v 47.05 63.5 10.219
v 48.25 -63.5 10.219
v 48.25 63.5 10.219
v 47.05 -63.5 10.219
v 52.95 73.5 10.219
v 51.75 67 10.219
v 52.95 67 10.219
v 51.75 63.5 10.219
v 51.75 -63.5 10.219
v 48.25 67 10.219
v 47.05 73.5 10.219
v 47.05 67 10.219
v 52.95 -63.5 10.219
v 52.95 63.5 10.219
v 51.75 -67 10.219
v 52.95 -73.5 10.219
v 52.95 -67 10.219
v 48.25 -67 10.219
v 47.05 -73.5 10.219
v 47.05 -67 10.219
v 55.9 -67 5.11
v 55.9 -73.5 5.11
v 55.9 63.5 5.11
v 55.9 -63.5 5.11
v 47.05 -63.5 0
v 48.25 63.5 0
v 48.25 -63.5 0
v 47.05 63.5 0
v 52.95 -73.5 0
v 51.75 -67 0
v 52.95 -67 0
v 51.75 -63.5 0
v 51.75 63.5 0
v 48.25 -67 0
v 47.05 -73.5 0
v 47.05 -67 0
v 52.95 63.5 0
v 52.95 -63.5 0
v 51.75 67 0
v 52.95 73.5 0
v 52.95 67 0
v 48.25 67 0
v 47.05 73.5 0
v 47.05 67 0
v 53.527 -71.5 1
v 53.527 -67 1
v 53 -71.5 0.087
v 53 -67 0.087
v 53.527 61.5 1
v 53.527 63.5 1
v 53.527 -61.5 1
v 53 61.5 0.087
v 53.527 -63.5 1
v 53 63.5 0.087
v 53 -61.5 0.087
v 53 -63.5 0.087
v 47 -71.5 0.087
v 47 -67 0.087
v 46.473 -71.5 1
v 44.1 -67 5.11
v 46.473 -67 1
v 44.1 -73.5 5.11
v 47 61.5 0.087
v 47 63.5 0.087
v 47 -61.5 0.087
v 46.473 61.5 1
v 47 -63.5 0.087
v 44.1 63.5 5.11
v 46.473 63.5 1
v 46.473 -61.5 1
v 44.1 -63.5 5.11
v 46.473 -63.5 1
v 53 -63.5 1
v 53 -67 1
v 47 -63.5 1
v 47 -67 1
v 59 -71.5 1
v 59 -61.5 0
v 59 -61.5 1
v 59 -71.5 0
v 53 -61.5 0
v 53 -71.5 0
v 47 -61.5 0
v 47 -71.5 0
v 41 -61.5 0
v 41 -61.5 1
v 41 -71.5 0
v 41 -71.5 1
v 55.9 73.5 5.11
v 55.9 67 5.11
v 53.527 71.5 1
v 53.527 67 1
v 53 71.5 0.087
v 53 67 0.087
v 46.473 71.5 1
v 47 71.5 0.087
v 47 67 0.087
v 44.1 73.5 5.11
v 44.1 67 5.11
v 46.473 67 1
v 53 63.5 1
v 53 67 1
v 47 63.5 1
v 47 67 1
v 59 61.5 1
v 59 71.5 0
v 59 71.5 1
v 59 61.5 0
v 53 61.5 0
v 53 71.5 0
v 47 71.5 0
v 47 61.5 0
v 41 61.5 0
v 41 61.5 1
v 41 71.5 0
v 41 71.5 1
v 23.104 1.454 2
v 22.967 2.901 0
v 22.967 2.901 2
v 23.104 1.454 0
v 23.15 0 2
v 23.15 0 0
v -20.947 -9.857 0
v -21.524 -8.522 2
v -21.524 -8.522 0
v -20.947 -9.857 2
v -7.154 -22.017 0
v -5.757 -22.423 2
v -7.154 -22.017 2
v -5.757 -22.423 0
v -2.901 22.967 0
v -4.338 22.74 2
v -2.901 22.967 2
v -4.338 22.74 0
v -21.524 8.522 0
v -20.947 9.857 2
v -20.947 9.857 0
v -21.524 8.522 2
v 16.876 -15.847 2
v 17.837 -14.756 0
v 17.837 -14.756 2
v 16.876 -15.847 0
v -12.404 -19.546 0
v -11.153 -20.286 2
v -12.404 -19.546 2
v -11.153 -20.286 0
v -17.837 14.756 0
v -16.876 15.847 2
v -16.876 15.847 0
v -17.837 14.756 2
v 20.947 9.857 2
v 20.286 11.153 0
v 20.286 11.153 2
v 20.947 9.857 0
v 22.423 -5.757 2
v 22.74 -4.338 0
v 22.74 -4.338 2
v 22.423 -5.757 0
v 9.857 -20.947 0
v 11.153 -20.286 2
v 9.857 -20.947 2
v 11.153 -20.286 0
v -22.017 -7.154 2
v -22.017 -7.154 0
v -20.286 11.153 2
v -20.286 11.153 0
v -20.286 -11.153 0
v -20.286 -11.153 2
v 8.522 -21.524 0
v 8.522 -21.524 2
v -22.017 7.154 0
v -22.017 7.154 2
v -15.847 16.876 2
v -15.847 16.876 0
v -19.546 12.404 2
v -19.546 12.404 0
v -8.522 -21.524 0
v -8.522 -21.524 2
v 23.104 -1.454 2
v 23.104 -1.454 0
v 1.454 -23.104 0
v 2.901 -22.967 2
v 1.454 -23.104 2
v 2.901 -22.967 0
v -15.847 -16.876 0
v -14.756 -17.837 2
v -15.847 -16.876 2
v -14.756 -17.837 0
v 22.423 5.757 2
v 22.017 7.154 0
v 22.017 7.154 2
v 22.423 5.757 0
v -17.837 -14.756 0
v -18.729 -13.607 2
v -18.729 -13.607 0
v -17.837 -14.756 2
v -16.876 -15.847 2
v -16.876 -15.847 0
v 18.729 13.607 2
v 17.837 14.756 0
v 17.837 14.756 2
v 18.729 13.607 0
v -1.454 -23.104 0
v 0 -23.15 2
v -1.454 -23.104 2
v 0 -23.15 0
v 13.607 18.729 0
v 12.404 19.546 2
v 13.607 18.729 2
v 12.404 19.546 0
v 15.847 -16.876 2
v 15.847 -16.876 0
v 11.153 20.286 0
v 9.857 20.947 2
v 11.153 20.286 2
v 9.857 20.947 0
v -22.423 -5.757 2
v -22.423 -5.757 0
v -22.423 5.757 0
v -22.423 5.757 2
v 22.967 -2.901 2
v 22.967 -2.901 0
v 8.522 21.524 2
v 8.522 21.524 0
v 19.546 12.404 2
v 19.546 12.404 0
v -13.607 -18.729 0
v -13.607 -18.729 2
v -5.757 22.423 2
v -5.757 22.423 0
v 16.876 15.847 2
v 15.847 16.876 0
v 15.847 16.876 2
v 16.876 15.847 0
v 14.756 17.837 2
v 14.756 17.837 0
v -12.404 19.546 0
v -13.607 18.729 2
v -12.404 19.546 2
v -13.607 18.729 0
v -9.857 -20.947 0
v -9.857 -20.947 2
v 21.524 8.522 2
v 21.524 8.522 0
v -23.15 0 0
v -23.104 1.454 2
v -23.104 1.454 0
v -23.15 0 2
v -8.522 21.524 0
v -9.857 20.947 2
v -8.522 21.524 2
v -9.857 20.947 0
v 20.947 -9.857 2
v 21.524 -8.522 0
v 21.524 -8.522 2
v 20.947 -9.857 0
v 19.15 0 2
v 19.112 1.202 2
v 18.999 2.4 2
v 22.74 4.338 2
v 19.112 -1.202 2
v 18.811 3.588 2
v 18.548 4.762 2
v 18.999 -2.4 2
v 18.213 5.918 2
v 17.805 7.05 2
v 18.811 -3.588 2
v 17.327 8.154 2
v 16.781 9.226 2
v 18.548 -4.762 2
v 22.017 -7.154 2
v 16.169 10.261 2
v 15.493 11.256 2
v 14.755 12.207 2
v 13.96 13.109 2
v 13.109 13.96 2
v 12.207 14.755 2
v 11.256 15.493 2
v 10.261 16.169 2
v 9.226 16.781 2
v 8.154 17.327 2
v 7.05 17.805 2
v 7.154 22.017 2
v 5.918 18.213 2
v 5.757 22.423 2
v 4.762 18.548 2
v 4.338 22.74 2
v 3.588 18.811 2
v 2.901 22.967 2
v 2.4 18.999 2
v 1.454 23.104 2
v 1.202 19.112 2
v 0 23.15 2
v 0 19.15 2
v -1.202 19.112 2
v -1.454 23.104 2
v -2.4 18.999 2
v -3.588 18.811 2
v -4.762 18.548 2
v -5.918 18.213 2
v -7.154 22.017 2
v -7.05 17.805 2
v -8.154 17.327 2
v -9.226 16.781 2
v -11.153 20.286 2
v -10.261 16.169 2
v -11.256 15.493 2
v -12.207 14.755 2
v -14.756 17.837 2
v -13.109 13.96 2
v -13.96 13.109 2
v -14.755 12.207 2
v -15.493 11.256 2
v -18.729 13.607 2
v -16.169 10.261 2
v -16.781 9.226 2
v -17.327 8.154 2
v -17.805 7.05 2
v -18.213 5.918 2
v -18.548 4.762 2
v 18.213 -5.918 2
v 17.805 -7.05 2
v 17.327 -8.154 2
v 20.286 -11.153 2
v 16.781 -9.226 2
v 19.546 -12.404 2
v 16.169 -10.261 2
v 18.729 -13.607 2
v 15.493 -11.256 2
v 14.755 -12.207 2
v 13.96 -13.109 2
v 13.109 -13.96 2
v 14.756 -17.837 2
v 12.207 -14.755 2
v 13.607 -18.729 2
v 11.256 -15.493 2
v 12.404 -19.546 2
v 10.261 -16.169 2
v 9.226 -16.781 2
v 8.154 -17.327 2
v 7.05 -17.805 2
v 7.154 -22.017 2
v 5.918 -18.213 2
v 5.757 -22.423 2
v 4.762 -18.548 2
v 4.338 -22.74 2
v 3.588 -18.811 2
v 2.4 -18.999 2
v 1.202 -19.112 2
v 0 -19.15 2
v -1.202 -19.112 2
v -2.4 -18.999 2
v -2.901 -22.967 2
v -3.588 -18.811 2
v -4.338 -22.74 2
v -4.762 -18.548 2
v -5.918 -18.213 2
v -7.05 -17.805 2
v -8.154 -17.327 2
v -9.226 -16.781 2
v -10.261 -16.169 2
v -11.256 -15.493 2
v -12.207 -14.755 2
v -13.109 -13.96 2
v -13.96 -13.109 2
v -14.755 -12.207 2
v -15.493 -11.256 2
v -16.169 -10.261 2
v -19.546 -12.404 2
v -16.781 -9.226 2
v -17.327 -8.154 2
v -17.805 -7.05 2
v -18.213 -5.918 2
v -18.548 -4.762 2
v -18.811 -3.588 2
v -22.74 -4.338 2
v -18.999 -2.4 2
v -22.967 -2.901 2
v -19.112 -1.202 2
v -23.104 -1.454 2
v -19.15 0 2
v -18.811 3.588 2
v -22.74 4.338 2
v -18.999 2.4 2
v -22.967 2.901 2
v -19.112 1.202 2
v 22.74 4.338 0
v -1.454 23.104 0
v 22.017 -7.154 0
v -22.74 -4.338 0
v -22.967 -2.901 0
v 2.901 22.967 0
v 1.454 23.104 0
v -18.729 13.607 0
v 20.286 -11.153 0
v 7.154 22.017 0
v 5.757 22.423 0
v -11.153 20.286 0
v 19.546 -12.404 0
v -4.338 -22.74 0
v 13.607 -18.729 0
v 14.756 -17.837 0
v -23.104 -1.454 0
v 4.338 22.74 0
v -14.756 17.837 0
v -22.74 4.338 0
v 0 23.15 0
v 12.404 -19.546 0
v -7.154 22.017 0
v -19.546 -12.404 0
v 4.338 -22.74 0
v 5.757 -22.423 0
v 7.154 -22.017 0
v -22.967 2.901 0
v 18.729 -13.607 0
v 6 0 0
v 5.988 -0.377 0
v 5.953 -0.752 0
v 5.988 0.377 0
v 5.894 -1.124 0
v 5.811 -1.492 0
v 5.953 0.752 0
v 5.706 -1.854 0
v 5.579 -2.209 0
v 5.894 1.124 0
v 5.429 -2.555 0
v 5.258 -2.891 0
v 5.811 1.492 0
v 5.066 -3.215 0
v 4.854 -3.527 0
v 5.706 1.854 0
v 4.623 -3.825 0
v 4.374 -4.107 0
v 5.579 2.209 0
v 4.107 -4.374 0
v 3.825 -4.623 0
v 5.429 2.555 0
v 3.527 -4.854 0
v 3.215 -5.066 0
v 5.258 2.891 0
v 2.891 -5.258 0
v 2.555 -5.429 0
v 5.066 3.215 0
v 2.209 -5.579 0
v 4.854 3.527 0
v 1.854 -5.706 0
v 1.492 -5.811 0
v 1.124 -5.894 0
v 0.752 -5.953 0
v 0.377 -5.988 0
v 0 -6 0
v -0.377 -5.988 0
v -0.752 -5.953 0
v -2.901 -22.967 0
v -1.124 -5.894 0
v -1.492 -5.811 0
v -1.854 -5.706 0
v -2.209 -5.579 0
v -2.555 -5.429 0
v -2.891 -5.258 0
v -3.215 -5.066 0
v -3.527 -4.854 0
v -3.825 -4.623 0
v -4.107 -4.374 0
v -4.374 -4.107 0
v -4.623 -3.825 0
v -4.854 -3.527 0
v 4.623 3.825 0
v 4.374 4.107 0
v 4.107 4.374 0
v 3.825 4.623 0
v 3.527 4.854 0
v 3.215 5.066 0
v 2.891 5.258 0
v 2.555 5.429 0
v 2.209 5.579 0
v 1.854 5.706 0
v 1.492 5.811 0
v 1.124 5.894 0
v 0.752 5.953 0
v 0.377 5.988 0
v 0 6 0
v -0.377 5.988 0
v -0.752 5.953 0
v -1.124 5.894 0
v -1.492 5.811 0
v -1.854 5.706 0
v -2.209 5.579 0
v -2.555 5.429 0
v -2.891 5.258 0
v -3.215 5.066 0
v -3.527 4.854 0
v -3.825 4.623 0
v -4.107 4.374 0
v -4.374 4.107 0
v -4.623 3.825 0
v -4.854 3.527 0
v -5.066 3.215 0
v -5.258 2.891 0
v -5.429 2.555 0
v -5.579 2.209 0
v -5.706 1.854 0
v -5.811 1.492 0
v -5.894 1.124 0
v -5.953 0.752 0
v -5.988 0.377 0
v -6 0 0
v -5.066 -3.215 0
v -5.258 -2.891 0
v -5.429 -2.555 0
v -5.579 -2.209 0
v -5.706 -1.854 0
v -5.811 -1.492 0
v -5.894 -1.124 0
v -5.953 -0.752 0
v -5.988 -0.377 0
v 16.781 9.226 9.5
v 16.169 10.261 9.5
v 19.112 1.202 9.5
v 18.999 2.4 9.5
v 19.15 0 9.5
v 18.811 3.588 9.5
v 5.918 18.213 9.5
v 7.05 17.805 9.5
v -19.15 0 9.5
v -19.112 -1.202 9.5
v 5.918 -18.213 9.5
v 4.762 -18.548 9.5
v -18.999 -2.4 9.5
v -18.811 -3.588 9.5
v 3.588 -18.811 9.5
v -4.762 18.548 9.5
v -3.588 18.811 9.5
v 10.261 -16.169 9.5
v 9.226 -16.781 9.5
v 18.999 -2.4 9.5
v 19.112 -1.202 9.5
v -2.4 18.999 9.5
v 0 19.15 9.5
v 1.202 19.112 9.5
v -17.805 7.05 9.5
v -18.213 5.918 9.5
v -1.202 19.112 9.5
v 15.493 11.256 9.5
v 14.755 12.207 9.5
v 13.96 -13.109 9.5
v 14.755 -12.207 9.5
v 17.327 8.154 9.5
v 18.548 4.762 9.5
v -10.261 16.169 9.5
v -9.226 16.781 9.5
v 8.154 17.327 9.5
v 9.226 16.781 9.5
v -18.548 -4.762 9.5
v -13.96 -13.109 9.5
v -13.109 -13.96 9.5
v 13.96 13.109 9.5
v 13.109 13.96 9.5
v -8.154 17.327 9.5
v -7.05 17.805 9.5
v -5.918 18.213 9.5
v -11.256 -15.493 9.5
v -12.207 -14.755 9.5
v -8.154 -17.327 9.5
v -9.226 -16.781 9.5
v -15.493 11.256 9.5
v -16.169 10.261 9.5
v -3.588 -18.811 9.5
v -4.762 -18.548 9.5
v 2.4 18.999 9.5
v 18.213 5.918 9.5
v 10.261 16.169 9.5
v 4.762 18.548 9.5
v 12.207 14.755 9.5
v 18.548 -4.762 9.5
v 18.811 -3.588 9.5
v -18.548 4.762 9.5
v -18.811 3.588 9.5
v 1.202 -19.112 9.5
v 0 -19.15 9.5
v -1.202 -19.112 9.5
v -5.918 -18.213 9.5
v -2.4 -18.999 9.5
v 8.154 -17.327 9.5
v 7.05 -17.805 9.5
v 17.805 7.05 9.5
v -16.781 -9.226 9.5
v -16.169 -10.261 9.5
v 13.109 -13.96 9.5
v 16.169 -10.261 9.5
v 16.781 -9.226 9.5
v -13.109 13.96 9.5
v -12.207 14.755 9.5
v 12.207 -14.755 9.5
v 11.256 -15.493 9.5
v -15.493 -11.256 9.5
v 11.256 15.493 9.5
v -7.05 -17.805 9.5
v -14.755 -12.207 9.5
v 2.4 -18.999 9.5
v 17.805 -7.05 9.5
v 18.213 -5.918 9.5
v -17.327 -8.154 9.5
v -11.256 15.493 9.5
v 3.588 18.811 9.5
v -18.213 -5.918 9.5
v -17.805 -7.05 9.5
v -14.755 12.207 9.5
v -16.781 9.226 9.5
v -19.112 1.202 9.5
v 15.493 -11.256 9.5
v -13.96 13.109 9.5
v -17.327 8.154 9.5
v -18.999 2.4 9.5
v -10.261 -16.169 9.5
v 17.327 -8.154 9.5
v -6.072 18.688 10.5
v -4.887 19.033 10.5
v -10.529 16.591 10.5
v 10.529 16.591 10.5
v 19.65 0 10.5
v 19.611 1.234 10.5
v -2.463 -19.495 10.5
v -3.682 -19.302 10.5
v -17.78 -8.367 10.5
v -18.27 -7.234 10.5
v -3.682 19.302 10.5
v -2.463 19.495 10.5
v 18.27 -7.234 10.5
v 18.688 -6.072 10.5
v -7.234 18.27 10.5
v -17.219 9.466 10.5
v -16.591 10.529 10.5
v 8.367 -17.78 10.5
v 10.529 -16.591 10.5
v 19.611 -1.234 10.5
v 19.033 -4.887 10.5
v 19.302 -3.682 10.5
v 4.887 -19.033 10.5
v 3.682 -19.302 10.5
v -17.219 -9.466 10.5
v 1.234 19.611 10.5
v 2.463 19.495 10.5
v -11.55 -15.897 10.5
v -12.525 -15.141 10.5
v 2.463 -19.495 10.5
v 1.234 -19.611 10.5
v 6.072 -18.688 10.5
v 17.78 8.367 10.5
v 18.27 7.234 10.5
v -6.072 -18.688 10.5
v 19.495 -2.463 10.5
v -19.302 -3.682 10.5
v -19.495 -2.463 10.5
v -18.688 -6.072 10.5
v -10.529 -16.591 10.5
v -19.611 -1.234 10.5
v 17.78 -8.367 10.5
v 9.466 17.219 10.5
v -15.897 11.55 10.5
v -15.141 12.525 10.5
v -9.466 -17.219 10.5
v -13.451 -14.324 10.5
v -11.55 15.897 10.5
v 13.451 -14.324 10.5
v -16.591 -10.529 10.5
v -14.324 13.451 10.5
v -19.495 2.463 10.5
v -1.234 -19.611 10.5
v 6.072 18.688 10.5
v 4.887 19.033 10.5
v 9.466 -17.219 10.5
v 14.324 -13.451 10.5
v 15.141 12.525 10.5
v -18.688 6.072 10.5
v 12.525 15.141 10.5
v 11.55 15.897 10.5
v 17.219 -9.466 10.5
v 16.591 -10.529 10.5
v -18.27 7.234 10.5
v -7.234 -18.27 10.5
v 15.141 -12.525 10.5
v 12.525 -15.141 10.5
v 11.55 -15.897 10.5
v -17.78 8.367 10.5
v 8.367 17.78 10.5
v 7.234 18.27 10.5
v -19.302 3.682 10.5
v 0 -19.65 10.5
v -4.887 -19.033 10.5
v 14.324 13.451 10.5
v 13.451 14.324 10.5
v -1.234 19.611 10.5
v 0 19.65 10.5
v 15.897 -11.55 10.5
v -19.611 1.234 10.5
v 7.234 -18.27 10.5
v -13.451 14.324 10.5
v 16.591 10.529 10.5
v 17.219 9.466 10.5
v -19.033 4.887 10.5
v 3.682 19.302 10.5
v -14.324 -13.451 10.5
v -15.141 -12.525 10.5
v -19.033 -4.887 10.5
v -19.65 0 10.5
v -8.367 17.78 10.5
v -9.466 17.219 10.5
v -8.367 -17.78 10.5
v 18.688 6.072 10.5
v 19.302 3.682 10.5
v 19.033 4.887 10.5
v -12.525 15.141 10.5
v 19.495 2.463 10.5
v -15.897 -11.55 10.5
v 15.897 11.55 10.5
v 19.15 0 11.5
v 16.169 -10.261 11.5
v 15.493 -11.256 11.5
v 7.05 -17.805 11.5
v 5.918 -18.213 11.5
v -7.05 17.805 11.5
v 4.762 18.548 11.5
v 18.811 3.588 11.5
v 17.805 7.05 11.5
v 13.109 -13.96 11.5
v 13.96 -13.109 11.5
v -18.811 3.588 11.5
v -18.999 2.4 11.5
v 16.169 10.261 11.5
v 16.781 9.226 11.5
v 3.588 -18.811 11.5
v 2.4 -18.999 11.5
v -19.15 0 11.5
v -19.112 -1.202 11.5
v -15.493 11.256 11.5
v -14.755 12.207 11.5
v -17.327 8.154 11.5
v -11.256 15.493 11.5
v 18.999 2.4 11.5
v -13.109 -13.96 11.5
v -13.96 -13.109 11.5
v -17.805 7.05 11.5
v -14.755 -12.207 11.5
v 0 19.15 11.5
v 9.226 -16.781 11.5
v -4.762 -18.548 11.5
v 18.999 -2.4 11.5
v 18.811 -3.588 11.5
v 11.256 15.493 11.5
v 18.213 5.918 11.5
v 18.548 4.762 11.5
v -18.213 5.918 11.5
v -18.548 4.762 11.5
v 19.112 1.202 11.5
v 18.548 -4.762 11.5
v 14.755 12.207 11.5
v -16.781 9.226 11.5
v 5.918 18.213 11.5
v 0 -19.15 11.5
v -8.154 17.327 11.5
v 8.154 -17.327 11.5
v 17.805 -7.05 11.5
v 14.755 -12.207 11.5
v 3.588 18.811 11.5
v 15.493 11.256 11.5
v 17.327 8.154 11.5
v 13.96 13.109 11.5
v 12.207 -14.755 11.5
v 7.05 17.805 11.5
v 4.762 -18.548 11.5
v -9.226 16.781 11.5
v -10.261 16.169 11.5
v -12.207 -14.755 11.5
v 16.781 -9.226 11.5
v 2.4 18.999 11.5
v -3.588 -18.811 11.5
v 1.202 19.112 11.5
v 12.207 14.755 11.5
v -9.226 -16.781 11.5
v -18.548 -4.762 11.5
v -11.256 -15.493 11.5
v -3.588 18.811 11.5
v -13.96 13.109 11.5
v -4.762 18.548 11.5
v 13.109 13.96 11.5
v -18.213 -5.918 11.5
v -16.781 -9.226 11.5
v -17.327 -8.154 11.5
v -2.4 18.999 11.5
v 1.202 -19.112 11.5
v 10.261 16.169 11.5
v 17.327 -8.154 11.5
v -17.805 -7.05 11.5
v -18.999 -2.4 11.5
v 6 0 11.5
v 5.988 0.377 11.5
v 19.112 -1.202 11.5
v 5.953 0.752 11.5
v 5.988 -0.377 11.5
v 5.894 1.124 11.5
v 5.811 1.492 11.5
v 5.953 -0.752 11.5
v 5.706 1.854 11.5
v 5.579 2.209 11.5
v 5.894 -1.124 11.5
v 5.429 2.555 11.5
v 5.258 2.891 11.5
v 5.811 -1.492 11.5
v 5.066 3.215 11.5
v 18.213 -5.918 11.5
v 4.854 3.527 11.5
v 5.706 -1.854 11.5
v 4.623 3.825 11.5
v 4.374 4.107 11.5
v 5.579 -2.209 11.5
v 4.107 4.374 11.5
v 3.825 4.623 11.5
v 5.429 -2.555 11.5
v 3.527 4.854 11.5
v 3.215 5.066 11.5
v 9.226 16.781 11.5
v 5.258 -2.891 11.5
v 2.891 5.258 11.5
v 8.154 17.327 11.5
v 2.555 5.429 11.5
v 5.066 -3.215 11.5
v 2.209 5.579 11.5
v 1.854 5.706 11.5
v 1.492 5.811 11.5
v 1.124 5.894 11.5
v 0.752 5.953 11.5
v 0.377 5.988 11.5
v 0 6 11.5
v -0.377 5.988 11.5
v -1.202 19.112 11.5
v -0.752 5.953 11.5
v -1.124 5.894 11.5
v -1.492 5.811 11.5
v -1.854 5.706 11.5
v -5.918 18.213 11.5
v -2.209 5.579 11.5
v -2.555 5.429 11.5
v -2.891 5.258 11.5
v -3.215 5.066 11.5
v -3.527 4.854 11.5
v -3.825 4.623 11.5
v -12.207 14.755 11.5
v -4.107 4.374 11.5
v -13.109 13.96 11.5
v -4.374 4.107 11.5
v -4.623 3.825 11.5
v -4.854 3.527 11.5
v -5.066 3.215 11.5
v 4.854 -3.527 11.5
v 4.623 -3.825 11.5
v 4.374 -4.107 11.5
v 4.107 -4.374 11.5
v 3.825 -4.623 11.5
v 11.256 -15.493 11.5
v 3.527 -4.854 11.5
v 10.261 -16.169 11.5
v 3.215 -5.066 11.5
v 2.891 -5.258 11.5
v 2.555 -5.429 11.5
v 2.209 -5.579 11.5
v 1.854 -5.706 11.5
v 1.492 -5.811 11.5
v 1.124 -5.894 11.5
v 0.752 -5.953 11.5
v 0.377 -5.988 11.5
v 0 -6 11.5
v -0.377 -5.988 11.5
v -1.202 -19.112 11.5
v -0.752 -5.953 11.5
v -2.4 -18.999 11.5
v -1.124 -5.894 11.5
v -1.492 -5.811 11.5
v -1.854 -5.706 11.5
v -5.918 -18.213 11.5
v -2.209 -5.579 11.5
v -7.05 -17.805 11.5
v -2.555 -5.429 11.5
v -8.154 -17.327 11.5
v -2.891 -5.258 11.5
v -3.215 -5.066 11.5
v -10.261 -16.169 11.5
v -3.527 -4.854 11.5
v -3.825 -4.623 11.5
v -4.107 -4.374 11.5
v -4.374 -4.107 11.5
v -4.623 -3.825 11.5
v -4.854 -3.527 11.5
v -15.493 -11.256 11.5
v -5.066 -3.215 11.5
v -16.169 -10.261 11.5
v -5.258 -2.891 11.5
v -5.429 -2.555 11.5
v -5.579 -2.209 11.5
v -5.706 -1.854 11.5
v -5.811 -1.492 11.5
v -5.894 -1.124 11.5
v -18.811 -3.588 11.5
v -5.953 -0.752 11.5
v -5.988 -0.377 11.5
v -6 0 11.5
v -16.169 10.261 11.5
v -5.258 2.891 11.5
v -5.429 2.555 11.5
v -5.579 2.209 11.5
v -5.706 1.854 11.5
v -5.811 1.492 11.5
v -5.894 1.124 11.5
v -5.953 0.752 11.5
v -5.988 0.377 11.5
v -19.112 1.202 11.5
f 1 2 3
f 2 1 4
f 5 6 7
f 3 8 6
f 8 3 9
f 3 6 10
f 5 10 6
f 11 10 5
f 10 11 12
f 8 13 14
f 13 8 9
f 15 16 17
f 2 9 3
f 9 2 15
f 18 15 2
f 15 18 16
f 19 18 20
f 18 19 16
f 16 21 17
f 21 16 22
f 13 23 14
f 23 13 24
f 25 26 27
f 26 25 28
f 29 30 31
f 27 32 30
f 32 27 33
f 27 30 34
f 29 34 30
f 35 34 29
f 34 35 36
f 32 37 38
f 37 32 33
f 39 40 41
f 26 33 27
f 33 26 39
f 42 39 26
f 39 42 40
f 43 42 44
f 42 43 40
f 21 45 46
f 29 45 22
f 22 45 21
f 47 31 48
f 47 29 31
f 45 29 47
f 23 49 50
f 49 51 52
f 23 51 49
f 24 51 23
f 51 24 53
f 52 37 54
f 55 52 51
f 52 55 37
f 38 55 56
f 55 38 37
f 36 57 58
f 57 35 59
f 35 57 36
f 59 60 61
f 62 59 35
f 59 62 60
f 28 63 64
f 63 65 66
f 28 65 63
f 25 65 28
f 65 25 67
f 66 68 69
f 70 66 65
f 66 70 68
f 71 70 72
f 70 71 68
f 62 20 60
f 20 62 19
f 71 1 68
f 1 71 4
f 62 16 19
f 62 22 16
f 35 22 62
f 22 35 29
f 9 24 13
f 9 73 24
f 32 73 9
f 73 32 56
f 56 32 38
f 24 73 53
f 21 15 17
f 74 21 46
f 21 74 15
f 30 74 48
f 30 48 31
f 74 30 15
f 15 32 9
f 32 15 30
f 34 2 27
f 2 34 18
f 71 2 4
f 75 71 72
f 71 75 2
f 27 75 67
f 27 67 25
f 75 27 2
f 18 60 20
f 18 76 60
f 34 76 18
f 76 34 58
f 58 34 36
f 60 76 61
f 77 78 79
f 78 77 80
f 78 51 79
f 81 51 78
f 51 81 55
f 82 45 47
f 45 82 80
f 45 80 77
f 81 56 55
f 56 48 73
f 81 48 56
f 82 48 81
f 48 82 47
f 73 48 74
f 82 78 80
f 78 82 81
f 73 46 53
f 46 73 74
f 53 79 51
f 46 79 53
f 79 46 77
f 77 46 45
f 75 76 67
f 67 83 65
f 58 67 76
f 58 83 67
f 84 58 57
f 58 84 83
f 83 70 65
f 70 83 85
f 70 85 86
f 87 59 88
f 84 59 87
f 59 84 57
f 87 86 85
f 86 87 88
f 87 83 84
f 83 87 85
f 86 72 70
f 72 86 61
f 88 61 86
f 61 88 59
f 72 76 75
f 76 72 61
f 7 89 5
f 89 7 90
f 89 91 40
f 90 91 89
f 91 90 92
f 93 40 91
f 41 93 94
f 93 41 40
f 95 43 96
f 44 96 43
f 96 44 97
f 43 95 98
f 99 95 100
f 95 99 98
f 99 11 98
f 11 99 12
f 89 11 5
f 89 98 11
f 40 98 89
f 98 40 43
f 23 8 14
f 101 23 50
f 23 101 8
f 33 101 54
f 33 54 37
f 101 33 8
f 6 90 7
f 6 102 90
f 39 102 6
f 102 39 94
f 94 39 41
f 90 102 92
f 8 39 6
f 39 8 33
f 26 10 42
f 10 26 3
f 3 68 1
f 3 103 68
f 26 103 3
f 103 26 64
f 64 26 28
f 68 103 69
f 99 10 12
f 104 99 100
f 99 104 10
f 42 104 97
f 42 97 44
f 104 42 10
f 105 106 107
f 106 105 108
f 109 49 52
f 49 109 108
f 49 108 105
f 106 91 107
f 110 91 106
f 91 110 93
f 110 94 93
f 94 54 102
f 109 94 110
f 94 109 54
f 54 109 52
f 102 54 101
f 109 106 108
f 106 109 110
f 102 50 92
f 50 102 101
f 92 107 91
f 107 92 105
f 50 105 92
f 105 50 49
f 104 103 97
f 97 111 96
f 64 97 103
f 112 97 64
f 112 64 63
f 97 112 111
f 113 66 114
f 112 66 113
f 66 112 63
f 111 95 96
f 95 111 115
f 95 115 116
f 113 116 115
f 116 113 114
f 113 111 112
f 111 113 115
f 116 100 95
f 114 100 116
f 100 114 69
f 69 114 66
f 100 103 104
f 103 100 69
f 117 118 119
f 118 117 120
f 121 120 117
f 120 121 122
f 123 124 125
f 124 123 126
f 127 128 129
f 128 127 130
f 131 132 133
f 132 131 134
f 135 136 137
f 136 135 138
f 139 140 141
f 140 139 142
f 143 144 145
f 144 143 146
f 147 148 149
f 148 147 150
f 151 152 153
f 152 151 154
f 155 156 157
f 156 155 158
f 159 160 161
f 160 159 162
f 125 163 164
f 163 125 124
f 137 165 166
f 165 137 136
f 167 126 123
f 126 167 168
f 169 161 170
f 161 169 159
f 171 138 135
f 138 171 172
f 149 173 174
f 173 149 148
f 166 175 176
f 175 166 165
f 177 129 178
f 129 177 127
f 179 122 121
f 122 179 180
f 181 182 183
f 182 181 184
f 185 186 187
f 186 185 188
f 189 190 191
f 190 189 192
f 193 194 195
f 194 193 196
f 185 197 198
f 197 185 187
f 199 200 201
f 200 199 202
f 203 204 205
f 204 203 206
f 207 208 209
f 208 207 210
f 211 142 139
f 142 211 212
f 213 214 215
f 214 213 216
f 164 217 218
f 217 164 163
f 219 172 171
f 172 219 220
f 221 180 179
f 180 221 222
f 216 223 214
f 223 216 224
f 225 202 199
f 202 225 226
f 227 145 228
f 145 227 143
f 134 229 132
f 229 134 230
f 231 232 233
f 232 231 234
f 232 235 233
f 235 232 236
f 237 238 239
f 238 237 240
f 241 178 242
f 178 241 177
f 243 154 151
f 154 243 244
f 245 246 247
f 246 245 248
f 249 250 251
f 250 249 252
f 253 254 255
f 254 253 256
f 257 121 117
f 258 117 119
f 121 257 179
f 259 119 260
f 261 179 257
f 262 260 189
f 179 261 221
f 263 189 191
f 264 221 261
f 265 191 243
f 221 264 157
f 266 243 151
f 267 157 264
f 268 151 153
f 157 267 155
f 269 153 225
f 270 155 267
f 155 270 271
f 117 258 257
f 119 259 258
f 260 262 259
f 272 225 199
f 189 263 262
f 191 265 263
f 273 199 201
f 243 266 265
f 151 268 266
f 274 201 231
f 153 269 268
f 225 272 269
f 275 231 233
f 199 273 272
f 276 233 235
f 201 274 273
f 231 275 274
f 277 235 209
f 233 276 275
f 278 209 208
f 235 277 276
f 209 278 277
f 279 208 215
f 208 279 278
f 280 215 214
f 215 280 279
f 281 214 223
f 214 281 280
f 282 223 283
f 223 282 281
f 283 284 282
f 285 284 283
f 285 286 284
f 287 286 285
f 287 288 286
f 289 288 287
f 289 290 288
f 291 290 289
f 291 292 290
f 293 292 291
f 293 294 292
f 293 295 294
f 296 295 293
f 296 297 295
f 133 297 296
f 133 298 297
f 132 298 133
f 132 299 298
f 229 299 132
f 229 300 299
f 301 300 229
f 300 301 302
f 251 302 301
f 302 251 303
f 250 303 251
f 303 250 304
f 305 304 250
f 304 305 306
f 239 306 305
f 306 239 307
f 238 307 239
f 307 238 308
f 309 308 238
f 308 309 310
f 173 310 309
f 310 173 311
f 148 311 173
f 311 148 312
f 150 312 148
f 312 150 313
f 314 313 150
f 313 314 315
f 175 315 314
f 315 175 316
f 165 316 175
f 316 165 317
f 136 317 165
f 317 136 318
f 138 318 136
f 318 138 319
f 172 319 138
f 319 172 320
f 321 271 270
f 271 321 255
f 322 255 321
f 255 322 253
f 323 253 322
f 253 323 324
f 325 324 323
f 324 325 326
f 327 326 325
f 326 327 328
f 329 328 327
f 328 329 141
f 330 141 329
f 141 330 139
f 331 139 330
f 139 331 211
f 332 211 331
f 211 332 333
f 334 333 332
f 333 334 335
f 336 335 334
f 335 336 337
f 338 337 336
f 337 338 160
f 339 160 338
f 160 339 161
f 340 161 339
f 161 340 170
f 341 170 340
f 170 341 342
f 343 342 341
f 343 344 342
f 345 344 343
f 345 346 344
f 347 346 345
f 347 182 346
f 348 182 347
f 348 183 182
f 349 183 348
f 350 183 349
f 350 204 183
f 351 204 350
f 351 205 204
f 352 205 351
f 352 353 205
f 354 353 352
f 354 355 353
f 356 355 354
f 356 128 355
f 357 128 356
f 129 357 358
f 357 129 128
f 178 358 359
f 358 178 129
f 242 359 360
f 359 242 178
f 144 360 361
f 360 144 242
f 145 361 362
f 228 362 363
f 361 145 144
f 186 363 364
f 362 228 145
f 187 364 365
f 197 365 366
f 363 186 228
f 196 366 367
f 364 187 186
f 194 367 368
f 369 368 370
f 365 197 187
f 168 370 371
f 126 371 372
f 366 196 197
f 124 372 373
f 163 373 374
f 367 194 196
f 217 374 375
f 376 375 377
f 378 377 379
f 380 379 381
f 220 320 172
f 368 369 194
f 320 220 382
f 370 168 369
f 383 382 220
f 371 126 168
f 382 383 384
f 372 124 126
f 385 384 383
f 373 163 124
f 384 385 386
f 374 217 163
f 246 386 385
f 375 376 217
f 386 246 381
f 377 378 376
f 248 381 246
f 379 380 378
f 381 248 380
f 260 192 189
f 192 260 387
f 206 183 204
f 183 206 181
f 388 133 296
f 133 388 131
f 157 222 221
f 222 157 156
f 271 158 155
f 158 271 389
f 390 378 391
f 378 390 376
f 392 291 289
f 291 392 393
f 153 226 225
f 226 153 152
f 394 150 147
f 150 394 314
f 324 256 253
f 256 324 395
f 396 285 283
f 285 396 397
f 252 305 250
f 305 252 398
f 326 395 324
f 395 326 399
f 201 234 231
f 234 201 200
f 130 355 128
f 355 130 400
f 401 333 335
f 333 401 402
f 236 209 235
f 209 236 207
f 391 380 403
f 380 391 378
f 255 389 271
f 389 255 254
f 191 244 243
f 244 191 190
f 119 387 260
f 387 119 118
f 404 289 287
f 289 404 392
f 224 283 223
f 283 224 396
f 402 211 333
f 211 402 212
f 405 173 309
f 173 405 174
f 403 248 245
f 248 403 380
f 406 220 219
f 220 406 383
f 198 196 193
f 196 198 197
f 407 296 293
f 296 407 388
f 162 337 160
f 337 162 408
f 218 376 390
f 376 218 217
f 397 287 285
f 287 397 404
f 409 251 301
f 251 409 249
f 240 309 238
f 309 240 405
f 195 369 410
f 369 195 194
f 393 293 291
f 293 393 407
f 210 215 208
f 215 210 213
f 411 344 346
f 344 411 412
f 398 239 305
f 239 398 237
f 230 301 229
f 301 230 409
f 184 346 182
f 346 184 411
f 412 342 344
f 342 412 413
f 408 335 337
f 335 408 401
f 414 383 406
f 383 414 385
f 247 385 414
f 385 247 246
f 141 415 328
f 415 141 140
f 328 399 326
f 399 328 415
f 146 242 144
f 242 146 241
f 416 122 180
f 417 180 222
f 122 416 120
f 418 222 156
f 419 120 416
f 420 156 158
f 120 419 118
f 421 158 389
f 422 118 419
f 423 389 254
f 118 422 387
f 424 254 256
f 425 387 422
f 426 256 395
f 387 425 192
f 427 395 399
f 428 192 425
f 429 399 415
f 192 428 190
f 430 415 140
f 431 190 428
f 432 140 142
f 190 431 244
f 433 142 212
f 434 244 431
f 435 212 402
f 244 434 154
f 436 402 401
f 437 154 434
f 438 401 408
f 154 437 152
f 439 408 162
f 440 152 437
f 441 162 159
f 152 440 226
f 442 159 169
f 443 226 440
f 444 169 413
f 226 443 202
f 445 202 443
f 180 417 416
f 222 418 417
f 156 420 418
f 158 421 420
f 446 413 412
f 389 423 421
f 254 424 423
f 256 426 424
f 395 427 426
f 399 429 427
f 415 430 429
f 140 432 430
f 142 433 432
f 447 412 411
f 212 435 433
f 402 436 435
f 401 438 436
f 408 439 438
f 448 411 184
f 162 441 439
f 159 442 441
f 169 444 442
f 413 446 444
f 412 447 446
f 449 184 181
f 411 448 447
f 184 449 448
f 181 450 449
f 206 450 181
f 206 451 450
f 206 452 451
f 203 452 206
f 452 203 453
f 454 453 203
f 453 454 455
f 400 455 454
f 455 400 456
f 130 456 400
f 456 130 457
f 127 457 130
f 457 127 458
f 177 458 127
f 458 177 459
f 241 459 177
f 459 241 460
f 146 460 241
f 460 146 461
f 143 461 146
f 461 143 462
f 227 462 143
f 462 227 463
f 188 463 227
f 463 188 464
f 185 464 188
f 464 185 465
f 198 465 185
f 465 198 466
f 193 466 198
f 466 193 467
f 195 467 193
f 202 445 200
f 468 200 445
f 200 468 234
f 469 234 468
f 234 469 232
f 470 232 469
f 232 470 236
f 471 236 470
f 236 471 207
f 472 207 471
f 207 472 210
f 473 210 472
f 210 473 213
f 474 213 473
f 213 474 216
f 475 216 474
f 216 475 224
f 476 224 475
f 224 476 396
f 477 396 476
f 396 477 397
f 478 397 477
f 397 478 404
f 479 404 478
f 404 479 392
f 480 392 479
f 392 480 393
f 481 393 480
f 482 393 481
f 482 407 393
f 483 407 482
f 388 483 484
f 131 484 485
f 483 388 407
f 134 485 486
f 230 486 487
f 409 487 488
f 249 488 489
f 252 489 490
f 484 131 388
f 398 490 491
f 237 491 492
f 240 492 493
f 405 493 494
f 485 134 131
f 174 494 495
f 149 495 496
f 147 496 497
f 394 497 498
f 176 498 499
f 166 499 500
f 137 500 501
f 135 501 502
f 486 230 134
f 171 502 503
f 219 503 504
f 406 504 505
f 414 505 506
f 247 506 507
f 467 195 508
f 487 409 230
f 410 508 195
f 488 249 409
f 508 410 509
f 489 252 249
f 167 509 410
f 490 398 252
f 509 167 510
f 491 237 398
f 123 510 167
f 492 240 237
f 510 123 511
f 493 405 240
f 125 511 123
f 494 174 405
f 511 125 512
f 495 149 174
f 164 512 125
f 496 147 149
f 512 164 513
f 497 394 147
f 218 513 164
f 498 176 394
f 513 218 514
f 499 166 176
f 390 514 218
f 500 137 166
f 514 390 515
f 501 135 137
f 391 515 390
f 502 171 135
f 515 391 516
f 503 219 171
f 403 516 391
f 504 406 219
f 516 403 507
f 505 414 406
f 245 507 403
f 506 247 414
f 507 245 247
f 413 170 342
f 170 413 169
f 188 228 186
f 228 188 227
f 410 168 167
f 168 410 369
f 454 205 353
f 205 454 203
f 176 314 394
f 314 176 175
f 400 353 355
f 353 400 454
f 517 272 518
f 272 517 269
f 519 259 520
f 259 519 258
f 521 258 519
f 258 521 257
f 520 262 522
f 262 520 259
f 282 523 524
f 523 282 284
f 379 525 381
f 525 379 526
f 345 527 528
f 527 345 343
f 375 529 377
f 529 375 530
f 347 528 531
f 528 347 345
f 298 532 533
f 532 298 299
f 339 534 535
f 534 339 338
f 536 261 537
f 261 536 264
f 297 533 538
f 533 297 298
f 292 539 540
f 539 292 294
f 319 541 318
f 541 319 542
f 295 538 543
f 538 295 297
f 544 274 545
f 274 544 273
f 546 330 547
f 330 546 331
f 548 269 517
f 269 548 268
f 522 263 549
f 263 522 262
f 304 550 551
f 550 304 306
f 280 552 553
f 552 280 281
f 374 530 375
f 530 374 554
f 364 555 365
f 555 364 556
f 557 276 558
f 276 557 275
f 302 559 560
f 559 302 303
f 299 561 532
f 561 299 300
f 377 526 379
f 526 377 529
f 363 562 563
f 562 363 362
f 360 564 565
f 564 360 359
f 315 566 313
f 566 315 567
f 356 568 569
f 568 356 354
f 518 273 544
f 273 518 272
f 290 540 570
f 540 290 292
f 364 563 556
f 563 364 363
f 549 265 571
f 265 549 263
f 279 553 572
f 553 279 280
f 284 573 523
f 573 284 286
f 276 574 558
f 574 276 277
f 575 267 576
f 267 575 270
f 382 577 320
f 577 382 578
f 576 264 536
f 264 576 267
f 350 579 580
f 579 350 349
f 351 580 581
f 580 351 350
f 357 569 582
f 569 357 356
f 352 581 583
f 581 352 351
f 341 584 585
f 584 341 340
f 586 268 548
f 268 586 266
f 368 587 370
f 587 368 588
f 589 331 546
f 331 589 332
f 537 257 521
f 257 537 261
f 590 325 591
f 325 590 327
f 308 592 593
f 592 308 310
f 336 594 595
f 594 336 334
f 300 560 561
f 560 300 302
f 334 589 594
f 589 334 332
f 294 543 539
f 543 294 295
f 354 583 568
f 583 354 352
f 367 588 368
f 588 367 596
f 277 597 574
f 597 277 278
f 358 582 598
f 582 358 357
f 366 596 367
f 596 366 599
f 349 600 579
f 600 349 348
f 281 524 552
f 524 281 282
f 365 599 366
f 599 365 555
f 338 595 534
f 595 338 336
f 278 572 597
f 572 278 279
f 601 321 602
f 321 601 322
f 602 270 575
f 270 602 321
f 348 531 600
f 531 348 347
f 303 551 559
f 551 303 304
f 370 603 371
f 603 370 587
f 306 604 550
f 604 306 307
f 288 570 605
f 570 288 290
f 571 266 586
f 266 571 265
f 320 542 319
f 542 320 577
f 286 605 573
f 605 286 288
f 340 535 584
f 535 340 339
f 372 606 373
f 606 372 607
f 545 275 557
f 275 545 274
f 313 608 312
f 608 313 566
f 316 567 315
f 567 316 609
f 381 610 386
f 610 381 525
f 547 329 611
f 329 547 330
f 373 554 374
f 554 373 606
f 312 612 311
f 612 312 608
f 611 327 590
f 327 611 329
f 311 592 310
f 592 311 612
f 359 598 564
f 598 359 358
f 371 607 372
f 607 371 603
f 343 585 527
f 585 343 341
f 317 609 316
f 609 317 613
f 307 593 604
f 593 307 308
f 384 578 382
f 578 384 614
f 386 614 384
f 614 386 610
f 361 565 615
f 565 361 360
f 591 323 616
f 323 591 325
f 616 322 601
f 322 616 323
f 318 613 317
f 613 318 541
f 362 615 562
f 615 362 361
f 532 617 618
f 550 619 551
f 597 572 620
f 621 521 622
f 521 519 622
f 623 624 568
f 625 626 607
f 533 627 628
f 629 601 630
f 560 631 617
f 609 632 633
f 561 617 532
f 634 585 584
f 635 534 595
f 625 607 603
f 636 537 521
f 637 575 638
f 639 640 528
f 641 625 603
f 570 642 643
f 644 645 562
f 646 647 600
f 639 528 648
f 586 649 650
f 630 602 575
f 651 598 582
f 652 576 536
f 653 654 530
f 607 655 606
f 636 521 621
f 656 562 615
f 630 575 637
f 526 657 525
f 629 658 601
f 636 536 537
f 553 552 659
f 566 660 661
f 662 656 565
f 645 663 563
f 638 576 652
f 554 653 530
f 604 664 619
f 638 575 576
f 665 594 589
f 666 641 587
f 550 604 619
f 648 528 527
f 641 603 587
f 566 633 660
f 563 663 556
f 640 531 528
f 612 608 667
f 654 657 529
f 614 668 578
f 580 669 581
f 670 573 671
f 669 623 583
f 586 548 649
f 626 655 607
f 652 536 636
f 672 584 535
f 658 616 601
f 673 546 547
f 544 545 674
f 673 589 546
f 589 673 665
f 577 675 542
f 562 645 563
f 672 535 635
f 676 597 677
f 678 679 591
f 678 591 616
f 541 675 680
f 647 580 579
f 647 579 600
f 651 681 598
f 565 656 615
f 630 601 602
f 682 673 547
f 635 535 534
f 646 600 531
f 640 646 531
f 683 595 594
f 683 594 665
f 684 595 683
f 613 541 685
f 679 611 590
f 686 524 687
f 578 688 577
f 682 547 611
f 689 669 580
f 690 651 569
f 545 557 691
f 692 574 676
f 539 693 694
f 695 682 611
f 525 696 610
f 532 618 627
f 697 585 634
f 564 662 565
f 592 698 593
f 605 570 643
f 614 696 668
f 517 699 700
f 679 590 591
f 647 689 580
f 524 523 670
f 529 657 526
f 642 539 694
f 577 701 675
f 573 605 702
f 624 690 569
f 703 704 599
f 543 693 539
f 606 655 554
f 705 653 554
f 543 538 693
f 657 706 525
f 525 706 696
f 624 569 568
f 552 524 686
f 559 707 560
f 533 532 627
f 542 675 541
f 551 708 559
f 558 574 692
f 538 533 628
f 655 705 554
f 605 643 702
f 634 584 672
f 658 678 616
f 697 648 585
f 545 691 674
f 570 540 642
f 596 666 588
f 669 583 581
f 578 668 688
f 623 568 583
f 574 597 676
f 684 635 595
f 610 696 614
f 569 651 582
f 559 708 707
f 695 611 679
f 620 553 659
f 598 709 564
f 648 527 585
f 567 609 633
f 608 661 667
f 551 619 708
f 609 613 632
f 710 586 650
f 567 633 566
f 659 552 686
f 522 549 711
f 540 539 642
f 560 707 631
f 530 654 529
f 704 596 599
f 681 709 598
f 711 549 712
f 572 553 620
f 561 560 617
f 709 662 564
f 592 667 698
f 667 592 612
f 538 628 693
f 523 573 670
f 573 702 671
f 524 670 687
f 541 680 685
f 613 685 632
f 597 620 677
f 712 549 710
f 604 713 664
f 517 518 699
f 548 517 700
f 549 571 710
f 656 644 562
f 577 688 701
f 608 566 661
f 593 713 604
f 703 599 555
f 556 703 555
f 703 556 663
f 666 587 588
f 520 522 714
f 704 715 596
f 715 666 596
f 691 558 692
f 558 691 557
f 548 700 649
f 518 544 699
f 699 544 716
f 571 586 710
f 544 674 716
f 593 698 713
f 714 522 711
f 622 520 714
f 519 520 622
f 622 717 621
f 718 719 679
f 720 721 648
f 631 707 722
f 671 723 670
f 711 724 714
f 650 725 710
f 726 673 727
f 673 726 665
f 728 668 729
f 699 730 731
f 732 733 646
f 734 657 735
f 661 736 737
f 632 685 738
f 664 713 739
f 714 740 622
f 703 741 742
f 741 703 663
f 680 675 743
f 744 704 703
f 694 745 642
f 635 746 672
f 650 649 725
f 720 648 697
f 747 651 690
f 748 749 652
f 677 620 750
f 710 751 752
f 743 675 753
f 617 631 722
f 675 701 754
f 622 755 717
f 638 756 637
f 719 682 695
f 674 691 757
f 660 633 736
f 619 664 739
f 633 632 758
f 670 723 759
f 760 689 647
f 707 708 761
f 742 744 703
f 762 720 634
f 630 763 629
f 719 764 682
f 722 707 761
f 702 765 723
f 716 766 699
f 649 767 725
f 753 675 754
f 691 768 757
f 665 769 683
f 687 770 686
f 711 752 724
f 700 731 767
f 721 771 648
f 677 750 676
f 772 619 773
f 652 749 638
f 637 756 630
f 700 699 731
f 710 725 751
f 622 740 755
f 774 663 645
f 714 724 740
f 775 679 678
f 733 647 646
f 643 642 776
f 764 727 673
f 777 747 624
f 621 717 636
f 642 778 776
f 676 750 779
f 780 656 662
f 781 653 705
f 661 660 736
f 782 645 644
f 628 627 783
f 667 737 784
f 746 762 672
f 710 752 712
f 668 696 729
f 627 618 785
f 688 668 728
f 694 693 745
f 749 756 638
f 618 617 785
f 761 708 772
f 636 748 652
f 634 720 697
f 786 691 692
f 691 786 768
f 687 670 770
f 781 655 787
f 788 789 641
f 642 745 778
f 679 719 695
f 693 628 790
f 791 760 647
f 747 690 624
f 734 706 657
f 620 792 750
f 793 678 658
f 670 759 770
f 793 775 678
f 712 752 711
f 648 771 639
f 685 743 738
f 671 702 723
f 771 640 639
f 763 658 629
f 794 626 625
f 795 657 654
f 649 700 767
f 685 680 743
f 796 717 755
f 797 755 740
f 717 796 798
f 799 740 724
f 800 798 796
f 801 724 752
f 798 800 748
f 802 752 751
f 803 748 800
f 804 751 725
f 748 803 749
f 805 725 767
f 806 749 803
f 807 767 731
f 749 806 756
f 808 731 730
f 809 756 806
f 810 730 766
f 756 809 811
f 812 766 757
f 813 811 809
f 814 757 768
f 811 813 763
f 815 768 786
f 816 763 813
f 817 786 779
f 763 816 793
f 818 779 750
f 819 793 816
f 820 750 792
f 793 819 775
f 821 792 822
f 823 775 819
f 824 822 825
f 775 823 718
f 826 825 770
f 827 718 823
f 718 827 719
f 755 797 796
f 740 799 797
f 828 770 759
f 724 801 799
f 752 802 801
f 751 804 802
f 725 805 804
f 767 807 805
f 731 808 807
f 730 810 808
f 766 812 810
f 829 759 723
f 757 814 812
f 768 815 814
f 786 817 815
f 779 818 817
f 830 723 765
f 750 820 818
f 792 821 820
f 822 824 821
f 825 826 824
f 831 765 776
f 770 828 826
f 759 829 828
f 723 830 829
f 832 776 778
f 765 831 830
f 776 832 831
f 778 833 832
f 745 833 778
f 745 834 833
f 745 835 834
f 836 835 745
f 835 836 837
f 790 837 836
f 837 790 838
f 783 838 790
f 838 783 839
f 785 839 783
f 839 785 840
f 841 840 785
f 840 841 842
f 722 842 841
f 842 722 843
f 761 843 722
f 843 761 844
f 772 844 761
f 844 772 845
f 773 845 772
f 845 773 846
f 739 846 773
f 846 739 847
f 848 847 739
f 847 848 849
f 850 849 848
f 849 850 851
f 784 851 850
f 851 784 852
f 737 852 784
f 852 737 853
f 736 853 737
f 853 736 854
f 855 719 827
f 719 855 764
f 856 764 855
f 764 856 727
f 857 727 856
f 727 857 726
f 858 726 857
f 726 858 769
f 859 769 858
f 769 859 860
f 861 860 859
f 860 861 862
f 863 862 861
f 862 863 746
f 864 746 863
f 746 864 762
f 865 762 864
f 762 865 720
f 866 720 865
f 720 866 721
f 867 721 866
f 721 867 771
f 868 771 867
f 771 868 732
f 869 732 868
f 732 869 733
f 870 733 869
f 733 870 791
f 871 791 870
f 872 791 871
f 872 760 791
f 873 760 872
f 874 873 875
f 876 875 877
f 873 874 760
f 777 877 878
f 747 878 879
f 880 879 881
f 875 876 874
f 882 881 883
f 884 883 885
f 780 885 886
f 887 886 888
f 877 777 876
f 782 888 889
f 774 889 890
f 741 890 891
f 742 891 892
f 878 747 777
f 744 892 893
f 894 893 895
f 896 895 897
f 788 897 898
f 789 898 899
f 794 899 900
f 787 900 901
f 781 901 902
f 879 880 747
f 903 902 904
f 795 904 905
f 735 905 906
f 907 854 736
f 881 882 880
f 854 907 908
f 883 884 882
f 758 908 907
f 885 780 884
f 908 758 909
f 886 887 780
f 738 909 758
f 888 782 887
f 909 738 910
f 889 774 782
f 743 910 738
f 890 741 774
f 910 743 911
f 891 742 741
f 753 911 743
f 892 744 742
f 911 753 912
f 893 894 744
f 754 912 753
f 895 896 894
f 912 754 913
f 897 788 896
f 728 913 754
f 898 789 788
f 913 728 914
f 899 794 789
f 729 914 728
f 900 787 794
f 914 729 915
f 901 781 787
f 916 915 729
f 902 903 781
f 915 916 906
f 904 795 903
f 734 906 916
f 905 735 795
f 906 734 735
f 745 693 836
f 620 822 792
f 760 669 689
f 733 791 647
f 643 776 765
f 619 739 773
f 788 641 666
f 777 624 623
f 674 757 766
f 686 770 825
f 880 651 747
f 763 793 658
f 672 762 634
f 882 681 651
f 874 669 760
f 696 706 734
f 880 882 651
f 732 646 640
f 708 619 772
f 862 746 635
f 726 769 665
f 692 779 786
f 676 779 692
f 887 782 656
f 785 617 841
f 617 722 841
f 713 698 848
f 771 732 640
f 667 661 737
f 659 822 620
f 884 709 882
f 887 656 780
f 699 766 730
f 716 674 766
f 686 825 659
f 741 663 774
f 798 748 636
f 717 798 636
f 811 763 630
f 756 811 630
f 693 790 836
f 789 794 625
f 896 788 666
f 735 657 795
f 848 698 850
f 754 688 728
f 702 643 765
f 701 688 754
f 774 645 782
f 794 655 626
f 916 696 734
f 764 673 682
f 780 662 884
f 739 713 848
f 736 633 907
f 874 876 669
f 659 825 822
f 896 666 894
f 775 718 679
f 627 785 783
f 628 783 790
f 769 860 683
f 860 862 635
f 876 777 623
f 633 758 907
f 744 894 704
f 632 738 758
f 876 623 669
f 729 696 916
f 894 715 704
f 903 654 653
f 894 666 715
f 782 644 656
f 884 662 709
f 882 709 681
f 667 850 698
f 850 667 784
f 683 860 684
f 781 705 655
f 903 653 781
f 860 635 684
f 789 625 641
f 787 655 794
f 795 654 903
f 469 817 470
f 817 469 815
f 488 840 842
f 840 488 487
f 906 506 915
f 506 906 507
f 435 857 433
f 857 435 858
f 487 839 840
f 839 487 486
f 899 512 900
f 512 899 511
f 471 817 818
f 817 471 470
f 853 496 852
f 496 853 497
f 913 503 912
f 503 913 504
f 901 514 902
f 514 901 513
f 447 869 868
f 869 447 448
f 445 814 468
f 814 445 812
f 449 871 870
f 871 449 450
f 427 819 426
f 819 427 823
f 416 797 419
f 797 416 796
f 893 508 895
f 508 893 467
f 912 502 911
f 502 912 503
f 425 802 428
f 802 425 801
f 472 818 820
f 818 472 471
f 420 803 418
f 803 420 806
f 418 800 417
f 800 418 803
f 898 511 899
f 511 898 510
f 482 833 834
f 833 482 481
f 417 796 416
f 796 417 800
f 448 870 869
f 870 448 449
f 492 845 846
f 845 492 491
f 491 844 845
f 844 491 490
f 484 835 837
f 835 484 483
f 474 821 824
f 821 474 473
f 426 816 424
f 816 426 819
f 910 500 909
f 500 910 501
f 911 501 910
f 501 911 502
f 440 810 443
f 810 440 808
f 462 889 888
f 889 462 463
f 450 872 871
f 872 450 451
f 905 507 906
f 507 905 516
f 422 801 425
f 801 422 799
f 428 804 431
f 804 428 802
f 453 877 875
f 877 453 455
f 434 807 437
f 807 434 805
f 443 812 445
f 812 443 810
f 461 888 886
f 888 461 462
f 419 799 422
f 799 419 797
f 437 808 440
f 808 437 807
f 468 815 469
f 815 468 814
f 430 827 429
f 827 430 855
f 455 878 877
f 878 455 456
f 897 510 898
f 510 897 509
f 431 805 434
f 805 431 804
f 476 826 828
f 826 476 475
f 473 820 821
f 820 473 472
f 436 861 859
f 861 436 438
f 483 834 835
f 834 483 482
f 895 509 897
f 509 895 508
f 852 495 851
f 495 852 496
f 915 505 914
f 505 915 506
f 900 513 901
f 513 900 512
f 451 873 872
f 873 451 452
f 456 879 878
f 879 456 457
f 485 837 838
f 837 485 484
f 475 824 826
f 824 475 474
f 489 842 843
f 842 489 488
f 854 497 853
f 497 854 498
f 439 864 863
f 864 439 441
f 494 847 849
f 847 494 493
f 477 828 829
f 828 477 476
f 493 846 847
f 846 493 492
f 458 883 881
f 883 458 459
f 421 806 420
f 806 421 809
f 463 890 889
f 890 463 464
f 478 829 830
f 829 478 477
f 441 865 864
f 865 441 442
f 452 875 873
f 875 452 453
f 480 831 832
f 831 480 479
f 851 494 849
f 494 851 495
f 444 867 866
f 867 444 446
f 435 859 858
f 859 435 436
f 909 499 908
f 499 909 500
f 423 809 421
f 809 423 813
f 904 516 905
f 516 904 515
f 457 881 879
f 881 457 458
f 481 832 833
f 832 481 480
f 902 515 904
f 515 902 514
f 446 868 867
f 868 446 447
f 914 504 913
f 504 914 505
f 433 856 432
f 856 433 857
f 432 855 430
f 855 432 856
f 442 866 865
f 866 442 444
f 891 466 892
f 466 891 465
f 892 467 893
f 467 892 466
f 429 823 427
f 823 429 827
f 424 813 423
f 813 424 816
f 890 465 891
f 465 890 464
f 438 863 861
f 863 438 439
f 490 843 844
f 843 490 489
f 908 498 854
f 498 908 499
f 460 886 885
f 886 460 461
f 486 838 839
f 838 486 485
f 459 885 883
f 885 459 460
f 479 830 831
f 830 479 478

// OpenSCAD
/////////////////////////////////////////////////////////////////////
////////////////////Support for filamentrolls ///////////////////
///////////////////iprusa 3 P3Steel www.printer3d.com////////////////////////
/*date:04-09-2015
programmed by: ruudoleo
license:
program: Openscad

*/

/////////////////////////////////////////////////////////////////////
////////////////////////////Parameters//////////////////////////

/*[roller and hexas]*/
    holedia=12;
    tolerance=0.2;  
    rollerdiameter=38.5;
/*[roller]*/
    rollerdepth=11;
    seamheightinside=1;
    brimoutsidethickness=2;
    brimoutsideheight=4;
    
/*[Hexas]*/
   supportdist=127;
   supportthickness=3.5;

/*[Print what]*/
part="both";//[hexas:hexas,centerring:centerring,both:both]

/*[Hidden]*/
   hexwidth=(holedia-tolerance)*sqrt(3)/2;
   hexlenght=supportdist/2+10;
   rollerdia=rollerdiameter-tolerance;
//////////////rendering//
if (part=="hexas"){ 
    translate([0,0,hexwidth/2])
 hex_As();   
}// endif
else{
    if (part=="centerring"){
     center_Ring();    
    }//end if
    else{
        translate([50,0,hexwidth/2])
      hex_As();
      center_Ring();  
    }//end else
} // end if
  
//////////////////modules///////
   //*****filamentrollersupport***
module hex_As(){
    rotate(a=270,v=[1,0,0])
     hexas(supportthickness,supportdist,hexlenght,holedia,hexwidth,tolerance);  
    
}// end module
module center_Ring(){
        support(rollerdia,rollerdepth,seamheightinside,brimoutsidethickness,brimoutsideheight);
}//end module


module support(rollerdia,rollerdepth,seamhightinside,brimoutsidethickness,brimoutsideheight){
      difference(){
      union(){
        //brim outside
          translate([0,0,brimoutsidethickness/2])
            cylinder(d=rollerdia+brimoutsideheight*2,h=brimoutsidethickness,center=true,$fn=100);
        //main cylinder
         translate([0,0,rollerdepth/2])
                 cylinder(d=rollerdia,h=rollerdepth,center=true,$fn=100);
         //brim inside 
         translate([0,0,rollerdepth-1])
            cylinder(r1=rollerdia/2,r2=rollerdia/2+seamheightinside/2,h=1,center=true,$fn=100);
         translate([0,0,rollerdepth])
             cylinder(r1=rollerdia/2+seamheightinside/2,r2=rollerdia/2,h=1,center=true,$fn=100);
    
  
}


// make hole
translate([0,0,rollerdepth/2])
                cylinder(d=holedia,h=rollerdepth+10,center=true,$fn=100);
}
}




     //*************hex as**********
     module hexas(supportthickness,supportdist,hexlenght,holedia,hexwidth,tolerance){
     halfhexas(supportthickness,supportdist,hexlenght,holedia,hexwidth,tolerance);
     mirror([0,0,1])
     halfhexas(supportthickness,supportdist,hexlenght,holedia,hexwidth,tolerance);
   }
     //*************halfhex as**********
     module halfhexas(supportthickness,supportdist,hexlenght,holedia,hexwidth,tolerance){
     difference(){
            //hexagonale as 
            translate([0,0,-hexlenght/2])
                cylinder(d=holedia-tolerance,h=hexlenght,center=true,$fn=6);
 
         
         //delete grooves
           translate([supportthickness/2,-hexwidth,-supportdist/2-supportthickness])
            cube(size=[hexwidth,hexwidth*2,supportthickness],center=false);
           translate([-hexwidth-supportthickness/2,-hexwidth,-supportdist/2-supportthickness])
             cube(size=[hexwidth,hexwidth*2,supportthickness],center=false);           
      }
               //////antiwarpsupport 3D print///
             translate([holedia*0.5,hexwidth/2-0.5,-hexlenght/2-supportdist/4+2])
                cube(size=[holedia/2,1,hexlenght-supportdist/2],center=true);
     
     
        translate([-holedia*0.5,hexwidth/2-0.5,-hexlenght/2-supportdist/4+2])
                cube(size=[holedia/2,1,hexlenght-supportdist/2],center=true);
  }
     
